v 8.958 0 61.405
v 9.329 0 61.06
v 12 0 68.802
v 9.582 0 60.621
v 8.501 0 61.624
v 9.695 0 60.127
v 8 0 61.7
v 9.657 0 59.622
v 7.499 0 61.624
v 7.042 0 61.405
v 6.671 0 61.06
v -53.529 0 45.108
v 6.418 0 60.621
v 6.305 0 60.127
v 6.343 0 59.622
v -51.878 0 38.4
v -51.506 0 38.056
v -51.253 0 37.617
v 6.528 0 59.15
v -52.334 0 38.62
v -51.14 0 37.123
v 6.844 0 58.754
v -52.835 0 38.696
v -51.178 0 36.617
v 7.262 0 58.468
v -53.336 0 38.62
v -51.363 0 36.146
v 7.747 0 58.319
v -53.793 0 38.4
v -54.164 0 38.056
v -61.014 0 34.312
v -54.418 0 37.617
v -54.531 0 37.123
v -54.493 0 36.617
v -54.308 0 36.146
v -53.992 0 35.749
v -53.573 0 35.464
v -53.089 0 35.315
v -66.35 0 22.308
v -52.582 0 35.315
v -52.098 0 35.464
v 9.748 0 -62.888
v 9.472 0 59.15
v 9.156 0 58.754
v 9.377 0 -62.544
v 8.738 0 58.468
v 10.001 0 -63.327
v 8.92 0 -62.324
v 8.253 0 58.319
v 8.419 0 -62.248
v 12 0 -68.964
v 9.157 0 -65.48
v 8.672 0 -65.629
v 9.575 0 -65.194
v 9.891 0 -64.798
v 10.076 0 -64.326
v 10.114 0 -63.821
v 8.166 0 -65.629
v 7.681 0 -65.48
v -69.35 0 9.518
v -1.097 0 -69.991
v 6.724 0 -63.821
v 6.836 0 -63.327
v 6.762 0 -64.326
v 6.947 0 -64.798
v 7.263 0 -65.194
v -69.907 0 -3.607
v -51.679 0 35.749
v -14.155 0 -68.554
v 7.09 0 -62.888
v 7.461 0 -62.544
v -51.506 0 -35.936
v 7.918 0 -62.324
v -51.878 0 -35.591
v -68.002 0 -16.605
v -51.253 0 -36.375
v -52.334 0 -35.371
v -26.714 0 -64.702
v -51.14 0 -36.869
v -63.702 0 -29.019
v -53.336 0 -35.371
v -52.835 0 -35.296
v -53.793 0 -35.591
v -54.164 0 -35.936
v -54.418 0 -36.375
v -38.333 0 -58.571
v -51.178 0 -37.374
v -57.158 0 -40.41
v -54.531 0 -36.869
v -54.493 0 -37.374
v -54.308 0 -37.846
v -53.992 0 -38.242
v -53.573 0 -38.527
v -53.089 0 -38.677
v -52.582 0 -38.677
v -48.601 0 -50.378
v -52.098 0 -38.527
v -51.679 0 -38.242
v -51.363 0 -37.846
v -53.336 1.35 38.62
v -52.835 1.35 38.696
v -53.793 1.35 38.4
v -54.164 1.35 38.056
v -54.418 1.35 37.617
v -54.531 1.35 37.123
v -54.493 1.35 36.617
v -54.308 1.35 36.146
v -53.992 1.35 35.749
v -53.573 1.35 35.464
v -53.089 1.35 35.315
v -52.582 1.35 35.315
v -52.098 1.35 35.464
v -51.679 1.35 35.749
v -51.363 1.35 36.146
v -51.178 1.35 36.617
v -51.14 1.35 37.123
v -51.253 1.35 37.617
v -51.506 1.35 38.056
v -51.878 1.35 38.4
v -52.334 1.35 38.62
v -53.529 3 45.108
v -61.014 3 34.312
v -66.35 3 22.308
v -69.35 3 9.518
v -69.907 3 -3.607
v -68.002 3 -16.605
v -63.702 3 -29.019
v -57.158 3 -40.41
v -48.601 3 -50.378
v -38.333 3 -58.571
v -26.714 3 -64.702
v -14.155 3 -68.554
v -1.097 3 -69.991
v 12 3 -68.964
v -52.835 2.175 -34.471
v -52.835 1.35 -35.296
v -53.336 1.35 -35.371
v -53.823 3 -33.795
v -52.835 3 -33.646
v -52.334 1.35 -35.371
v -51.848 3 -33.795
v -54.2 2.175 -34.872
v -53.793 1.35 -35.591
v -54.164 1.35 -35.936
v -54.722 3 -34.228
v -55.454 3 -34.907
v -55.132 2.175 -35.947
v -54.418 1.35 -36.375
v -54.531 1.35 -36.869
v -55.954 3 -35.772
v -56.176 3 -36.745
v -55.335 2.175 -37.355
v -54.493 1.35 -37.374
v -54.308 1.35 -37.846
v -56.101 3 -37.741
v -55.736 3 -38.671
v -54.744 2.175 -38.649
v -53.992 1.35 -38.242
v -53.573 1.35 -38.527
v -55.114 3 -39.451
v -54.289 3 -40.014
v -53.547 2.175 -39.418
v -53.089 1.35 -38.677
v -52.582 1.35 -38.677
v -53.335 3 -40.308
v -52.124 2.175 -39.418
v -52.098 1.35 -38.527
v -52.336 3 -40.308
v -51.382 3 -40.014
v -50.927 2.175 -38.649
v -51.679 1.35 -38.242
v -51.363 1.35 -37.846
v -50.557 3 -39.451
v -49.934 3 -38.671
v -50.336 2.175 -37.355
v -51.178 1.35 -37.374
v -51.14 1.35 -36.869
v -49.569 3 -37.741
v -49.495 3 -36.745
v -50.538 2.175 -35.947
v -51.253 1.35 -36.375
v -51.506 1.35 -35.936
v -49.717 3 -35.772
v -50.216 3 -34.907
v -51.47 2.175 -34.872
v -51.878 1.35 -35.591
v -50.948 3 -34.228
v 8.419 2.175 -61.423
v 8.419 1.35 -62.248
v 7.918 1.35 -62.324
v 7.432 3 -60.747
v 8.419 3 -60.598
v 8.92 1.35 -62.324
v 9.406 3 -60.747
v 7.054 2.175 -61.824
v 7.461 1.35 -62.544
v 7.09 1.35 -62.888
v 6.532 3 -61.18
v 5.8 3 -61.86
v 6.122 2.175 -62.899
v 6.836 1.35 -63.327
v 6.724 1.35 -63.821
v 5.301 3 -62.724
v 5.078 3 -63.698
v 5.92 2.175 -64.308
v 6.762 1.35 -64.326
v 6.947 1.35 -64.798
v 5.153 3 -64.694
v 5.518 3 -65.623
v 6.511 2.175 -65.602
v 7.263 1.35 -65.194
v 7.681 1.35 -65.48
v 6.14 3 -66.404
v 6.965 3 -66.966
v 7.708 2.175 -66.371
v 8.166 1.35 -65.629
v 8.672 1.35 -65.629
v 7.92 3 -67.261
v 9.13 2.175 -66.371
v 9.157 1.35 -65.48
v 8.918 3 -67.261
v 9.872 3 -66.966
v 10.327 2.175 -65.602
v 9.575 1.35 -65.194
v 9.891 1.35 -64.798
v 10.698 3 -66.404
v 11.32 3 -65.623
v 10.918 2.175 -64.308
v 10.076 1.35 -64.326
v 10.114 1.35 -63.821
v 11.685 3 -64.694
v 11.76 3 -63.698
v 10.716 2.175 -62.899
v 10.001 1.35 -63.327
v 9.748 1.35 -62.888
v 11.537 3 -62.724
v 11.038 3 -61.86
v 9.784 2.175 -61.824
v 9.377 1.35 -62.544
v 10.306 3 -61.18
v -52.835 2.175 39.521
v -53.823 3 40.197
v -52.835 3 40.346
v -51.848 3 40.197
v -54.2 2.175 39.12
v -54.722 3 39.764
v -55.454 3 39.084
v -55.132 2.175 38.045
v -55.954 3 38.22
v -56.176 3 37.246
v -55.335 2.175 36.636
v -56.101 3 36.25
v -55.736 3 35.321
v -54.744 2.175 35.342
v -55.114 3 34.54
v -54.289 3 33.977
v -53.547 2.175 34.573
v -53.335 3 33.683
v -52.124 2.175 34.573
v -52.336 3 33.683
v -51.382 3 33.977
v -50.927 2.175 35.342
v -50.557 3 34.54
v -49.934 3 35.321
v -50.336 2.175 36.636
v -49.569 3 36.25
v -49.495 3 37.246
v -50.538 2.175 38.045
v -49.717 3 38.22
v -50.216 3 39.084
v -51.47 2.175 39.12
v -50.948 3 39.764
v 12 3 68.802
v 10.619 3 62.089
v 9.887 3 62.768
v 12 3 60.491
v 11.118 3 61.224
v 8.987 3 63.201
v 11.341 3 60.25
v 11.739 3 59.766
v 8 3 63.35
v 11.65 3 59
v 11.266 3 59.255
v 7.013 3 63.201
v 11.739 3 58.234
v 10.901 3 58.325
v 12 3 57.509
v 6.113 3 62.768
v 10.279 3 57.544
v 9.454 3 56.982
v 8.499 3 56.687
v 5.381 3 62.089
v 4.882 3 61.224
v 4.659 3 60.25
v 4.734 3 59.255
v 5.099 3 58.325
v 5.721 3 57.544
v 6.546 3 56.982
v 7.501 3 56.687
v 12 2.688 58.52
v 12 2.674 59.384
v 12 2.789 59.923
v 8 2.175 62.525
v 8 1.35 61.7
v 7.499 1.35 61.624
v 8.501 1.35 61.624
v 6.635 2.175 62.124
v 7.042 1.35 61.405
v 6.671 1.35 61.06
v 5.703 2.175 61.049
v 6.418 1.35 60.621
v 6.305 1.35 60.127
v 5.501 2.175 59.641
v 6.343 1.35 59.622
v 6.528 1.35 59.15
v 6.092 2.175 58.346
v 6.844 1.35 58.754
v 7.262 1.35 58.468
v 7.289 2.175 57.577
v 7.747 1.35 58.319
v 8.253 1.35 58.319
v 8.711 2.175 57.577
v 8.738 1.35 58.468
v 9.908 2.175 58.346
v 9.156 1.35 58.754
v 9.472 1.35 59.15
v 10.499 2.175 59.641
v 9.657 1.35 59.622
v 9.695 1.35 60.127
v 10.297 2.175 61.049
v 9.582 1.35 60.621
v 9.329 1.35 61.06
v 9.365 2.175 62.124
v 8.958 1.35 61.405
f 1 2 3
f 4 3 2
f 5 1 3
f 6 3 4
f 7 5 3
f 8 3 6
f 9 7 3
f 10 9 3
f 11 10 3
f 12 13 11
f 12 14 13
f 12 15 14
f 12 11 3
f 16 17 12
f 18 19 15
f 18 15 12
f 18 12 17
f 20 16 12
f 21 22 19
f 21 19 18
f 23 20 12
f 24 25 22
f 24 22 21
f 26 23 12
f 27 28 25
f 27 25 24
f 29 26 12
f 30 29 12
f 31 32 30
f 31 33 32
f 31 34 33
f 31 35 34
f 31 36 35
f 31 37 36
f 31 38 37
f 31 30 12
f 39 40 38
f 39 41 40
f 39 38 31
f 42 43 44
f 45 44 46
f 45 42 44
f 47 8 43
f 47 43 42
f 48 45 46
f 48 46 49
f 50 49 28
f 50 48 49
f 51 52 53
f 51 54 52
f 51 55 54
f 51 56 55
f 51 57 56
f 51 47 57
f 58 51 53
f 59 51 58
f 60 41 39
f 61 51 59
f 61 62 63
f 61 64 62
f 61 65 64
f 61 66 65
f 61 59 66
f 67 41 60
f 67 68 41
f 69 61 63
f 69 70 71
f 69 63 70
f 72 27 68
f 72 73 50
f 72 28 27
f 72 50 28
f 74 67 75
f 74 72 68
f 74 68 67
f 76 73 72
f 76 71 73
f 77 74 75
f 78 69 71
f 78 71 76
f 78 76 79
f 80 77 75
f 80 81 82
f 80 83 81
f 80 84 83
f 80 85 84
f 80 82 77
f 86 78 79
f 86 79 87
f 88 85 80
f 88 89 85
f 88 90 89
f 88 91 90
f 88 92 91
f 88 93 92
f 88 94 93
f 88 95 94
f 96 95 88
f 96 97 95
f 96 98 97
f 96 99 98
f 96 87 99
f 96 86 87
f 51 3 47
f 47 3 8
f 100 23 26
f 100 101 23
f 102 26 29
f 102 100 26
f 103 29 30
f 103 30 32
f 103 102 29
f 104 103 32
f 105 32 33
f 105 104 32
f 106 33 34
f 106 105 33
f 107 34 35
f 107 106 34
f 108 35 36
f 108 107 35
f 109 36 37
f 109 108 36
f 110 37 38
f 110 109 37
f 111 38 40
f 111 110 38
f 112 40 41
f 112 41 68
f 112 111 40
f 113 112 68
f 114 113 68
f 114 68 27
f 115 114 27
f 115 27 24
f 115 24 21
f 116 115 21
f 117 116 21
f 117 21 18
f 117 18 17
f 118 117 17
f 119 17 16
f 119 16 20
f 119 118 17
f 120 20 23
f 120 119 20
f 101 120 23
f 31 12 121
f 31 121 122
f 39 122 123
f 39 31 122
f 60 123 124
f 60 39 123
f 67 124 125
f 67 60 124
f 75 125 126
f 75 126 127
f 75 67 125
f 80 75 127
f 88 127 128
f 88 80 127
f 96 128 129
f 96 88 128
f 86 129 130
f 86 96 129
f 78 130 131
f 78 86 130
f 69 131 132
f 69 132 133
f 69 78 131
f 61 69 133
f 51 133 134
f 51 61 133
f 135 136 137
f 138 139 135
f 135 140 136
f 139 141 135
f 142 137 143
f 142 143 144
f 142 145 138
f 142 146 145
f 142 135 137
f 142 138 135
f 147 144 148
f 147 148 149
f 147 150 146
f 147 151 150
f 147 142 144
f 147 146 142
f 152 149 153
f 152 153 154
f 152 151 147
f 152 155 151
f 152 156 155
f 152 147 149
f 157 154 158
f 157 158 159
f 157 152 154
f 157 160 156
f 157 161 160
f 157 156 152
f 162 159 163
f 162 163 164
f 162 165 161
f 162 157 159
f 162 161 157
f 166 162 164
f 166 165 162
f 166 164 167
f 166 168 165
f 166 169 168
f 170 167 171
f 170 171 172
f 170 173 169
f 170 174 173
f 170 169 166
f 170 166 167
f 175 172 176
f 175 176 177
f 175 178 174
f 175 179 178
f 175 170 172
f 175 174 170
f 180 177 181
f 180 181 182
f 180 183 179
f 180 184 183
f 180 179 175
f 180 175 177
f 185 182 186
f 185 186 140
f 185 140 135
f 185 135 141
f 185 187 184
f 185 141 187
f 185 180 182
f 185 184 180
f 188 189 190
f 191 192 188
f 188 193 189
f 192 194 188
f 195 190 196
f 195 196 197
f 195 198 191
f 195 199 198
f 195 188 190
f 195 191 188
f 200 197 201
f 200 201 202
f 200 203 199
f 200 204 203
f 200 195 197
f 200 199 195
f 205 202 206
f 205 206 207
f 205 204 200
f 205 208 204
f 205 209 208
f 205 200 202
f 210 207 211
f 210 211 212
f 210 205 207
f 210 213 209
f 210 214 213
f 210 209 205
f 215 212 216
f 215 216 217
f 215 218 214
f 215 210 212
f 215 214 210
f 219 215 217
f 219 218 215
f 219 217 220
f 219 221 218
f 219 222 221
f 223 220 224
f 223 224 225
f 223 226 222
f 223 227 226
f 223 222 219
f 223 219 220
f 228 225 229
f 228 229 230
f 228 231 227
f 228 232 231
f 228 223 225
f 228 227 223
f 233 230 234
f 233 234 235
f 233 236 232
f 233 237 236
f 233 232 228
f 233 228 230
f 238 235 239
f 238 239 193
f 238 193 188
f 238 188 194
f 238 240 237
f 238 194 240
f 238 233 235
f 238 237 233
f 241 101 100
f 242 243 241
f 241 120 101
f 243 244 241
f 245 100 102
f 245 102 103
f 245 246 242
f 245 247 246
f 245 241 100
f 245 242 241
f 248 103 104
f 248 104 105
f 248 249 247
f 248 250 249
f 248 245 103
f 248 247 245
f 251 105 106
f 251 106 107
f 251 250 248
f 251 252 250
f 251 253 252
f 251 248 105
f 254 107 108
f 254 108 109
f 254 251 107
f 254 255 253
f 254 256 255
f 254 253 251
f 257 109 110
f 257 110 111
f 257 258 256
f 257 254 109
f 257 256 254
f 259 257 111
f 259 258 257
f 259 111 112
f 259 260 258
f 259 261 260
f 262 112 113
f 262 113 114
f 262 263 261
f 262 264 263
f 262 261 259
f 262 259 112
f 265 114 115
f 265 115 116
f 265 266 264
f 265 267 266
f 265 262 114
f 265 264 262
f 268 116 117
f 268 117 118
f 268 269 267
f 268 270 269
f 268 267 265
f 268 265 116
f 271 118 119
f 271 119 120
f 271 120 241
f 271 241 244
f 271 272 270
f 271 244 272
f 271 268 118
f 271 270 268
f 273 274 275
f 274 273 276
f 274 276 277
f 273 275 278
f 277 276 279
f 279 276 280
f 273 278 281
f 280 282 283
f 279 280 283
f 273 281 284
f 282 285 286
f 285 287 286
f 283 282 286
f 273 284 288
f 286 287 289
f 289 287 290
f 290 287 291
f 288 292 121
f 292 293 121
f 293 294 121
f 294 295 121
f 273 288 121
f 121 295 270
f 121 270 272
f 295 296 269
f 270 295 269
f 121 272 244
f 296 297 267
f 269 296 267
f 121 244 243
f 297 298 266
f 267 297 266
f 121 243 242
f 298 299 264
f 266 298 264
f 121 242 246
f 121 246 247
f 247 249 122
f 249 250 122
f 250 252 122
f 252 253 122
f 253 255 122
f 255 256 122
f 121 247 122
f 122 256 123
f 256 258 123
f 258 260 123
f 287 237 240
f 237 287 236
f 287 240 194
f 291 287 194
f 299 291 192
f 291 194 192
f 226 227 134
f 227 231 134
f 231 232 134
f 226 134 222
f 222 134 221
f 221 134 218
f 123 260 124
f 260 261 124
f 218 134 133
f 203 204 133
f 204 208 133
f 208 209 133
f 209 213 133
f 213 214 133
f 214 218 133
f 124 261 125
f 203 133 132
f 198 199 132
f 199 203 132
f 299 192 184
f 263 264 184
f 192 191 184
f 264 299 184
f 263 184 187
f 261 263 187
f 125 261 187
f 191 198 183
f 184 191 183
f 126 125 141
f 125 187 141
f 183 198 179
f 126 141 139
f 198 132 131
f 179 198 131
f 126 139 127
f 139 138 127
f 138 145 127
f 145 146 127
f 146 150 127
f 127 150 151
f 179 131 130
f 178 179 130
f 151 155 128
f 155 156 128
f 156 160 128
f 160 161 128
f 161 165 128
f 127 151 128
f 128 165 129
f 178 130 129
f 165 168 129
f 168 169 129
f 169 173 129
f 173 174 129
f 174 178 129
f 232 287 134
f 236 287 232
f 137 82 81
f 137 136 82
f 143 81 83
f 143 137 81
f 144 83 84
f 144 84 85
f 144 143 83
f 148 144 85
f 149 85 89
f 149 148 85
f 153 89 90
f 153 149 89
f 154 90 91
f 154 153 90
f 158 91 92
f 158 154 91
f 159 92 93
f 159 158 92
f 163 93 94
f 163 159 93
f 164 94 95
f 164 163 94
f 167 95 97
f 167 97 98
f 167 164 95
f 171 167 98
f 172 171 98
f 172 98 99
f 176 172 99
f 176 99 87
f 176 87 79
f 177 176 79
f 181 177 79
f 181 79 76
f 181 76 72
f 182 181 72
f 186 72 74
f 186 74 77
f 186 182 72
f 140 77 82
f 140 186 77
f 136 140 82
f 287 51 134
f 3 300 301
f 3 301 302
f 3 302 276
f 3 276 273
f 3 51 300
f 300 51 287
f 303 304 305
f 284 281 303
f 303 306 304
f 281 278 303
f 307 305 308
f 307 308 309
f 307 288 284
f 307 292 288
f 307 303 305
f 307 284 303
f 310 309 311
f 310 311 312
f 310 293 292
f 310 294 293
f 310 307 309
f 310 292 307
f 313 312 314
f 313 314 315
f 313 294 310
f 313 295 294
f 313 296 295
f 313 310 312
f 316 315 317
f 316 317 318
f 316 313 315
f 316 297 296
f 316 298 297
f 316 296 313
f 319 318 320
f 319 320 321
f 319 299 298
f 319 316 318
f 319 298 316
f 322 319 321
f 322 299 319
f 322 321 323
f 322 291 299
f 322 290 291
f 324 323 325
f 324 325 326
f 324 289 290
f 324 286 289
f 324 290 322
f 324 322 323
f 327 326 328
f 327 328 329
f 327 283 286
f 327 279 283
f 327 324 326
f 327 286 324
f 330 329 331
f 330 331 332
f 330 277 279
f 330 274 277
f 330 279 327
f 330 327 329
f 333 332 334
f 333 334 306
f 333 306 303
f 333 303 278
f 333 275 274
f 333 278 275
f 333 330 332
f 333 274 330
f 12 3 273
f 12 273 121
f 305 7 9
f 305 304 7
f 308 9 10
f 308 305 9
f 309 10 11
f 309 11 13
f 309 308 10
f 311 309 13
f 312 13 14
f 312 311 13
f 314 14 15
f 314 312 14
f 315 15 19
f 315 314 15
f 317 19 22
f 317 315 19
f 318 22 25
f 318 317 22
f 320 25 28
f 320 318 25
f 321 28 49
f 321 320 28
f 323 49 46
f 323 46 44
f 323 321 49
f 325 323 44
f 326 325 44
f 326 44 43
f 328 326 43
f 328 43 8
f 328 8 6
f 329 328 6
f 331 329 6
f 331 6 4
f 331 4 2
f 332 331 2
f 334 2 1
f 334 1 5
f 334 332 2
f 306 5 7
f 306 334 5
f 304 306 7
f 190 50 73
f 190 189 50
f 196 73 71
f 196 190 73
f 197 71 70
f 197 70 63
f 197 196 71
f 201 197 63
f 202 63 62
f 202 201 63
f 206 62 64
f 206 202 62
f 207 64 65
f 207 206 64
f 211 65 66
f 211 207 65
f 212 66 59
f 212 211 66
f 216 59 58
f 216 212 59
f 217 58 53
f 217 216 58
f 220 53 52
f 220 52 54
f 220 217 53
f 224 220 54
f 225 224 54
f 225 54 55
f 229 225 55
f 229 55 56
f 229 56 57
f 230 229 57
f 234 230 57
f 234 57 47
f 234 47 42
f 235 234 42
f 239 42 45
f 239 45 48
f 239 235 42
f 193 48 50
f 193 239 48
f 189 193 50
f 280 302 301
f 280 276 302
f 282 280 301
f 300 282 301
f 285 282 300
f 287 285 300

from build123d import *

# Parameters (mm, degrees)
BOSS_EXTRUDE1_DEPTH                            = 3
CSK_FOR_M3_FLAT_HEAD_MACHINE_SCREW1_AT_2_COUNT = 2
CSK_FOR_M3_FLAT_HEAD_MACHINE_SCREW1_AT_2_PITCH = 71.314927951
CSK_FOR_M3_FLAT_HEAD_MACHINE_SCREW1_AT_3_COUNT = 2
CSK_FOR_M3_FLAT_HEAD_MACHINE_SCREW1_AT_3_PITCH = 7.071067812
CSK_FOR_M3_FLAT_HEAD_MACHINE_SCREW1_AT_4_COUNT = 2
CSK_FOR_M3_FLAT_HEAD_MACHINE_SCREW1_AT_4_PITCH = 123.124200131
CSK_FOR_M3_FLAT_HEAD_MACHINE_SCREW1_AT_5_COUNT = 2
CSK_FOR_M3_FLAT_HEAD_MACHINE_SCREW1_AT_5_PITCH = 117.544882759


with BuildPart() as part:
    # Sketch1 → Boss-Extrude1 (new body)
    with BuildSketch(Plane(origin=(0, 0, 0), x_dir=(1, 0, 0), z_dir=(0, 1, 0))):
        with BuildLine():
            Line((12, 68.963758598), (12, -68.802405773))
            Line((12, -68.802405773), (-53.528576558, -45.107554707))
            ThreePointArc((-53.528576558, -45.107554707), (-60.697790714, 34.868011163), (12, 68.963758598))
        make_face()
    extrude(amount=BOSS_EXTRUDE1_DEPTH)

    # Sketch4 → CSK for M3 Flat Head Machine Screw1 (revolve, cut)
    with BuildSketch(Plane(origin=(15, 3, 59), x_dir=(0, 0, 1), z_dir=(1, 0, 0))):
        Polygon((0, 0), (0, 3), (1.7, 3), (1.7, 1.65), (3.35, 0), align=None)
    csk_for_m3_flat_head_machine_screw1 = revolve(axis=Axis((15, 9.35, 59), (0, -1, 0)), mode=Mode.SUBTRACT)

    # CSK for M3 Flat Head Machine Screw1 at 2: CSK for M3 Flat Head Machine Screw1 ×2
    with Locations(*[Vector(-0.9512076756694684, 0, -0.30855138591081943) * (i * CSK_FOR_M3_FLAT_HEAD_MACHINE_SCREW1_AT_2_PITCH) for i in range(1, CSK_FOR_M3_FLAT_HEAD_MACHINE_SCREW1_AT_2_COUNT)]):
        add(csk_for_m3_flat_head_machine_screw1, mode=Mode.SUBTRACT)

    # CSK for M3 Flat Head Machine Screw1 at 3: CSK for M3 Flat Head Machine Screw1 ×2
    with Locations(*[Vector(-0.9899494936611665, 0, 0.14142135623730978) * (i * CSK_FOR_M3_FLAT_HEAD_MACHINE_SCREW1_AT_3_PITCH) for i in range(1, CSK_FOR_M3_FLAT_HEAD_MACHINE_SCREW1_AT_3_COUNT)]):
        add(csk_for_m3_flat_head_machine_screw1, mode=Mode.SUBTRACT)

    # CSK for M3 Flat Head Machine Screw1 at 4: CSK for M3 Flat Head Machine Screw1 ×2
    with Locations(*[Vector(-0.053450585626457235, 0, -0.9985704957068323) * (i * CSK_FOR_M3_FLAT_HEAD_MACHINE_SCREW1_AT_4_PITCH) for i in range(1, CSK_FOR_M3_FLAT_HEAD_MACHINE_SCREW1_AT_4_COUNT)]):
        add(csk_for_m3_flat_head_machine_screw1, mode=Mode.SUBTRACT)

    # CSK for M3 Flat Head Machine Screw1 at 5: CSK for M3 Flat Head Machine Screw1 ×2
    with Locations(*[Vector(-0.5771013187861944, 0, -0.8166725585295709) * (i * CSK_FOR_M3_FLAT_HEAD_MACHINE_SCREW1_AT_5_PITCH) for i in range(1, CSK_FOR_M3_FLAT_HEAD_MACHINE_SCREW1_AT_5_COUNT)]):
        add(csk_for_m3_flat_head_machine_screw1, mode=Mode.SUBTRACT)


solid = part.part
